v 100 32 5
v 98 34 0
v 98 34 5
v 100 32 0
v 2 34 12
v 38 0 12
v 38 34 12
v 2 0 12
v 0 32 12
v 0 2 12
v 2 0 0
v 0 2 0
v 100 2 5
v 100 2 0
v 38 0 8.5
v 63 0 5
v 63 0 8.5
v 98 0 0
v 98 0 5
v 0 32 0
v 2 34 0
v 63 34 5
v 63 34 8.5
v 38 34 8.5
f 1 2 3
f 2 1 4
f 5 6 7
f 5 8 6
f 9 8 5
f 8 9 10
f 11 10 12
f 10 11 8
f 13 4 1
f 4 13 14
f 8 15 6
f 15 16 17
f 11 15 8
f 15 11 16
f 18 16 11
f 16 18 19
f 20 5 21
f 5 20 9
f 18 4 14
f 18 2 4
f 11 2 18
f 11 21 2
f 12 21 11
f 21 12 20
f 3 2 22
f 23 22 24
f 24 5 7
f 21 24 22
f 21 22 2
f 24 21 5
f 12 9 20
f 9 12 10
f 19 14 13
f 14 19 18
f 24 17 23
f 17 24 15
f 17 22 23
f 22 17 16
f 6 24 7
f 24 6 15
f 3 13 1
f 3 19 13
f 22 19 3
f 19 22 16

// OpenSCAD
$fn = 32;

// ----------------------------------------------------------------------
// Stepped bar: twostep, 100 x 34 x 12/5 mm
// ----------------------------------------------------------------------

// --- parameters (mm) ---
bar_l = 100;              // bar length, X
bar_w = 34;               // bar width, Y
plate_t = 12;             // thickness of the thick zone, Z
thin_t = 5;               // thickness of the thin zone
corner_c = 2;             // corner chamfer of the bar
step_cut = 7;             // material removed from the thin zone
stair1_x = 38;            // position of the first stair
stair2_x = 63;            // position of the second stair
mid_t = 8.5;              // thickness of the middle zone
depth_1 = 3.5;            // depth of cut 1 from the top face
depth_2 = 7;              // depth of cut 2 from the top face

profile = [[2, 0], [98, 0], [100, 2], [100, 32], [98, 34], [2, 34], [0, 32], [0, 2]];  // primary outline, 8 points, counter clockwise
void_1 = [[38, -1], [63, -1], [63, 35], [38, 35]];  // first stair, 4 points
void_2 = [[63, -1], [101, -1], [101, 35], [63, 35]];  // second stair, 4 points

// --- the one profile operation ---
difference() {
  linear_extrude(height = plate_t) polygon(points = profile);
  translate([0, 0, plate_t - depth_1])
    linear_extrude(height = depth_1 + 1) polygon(points = void_1);
  translate([0, 0, plate_t - depth_2])
    linear_extrude(height = depth_2 + 1) polygon(points = void_2);
}
